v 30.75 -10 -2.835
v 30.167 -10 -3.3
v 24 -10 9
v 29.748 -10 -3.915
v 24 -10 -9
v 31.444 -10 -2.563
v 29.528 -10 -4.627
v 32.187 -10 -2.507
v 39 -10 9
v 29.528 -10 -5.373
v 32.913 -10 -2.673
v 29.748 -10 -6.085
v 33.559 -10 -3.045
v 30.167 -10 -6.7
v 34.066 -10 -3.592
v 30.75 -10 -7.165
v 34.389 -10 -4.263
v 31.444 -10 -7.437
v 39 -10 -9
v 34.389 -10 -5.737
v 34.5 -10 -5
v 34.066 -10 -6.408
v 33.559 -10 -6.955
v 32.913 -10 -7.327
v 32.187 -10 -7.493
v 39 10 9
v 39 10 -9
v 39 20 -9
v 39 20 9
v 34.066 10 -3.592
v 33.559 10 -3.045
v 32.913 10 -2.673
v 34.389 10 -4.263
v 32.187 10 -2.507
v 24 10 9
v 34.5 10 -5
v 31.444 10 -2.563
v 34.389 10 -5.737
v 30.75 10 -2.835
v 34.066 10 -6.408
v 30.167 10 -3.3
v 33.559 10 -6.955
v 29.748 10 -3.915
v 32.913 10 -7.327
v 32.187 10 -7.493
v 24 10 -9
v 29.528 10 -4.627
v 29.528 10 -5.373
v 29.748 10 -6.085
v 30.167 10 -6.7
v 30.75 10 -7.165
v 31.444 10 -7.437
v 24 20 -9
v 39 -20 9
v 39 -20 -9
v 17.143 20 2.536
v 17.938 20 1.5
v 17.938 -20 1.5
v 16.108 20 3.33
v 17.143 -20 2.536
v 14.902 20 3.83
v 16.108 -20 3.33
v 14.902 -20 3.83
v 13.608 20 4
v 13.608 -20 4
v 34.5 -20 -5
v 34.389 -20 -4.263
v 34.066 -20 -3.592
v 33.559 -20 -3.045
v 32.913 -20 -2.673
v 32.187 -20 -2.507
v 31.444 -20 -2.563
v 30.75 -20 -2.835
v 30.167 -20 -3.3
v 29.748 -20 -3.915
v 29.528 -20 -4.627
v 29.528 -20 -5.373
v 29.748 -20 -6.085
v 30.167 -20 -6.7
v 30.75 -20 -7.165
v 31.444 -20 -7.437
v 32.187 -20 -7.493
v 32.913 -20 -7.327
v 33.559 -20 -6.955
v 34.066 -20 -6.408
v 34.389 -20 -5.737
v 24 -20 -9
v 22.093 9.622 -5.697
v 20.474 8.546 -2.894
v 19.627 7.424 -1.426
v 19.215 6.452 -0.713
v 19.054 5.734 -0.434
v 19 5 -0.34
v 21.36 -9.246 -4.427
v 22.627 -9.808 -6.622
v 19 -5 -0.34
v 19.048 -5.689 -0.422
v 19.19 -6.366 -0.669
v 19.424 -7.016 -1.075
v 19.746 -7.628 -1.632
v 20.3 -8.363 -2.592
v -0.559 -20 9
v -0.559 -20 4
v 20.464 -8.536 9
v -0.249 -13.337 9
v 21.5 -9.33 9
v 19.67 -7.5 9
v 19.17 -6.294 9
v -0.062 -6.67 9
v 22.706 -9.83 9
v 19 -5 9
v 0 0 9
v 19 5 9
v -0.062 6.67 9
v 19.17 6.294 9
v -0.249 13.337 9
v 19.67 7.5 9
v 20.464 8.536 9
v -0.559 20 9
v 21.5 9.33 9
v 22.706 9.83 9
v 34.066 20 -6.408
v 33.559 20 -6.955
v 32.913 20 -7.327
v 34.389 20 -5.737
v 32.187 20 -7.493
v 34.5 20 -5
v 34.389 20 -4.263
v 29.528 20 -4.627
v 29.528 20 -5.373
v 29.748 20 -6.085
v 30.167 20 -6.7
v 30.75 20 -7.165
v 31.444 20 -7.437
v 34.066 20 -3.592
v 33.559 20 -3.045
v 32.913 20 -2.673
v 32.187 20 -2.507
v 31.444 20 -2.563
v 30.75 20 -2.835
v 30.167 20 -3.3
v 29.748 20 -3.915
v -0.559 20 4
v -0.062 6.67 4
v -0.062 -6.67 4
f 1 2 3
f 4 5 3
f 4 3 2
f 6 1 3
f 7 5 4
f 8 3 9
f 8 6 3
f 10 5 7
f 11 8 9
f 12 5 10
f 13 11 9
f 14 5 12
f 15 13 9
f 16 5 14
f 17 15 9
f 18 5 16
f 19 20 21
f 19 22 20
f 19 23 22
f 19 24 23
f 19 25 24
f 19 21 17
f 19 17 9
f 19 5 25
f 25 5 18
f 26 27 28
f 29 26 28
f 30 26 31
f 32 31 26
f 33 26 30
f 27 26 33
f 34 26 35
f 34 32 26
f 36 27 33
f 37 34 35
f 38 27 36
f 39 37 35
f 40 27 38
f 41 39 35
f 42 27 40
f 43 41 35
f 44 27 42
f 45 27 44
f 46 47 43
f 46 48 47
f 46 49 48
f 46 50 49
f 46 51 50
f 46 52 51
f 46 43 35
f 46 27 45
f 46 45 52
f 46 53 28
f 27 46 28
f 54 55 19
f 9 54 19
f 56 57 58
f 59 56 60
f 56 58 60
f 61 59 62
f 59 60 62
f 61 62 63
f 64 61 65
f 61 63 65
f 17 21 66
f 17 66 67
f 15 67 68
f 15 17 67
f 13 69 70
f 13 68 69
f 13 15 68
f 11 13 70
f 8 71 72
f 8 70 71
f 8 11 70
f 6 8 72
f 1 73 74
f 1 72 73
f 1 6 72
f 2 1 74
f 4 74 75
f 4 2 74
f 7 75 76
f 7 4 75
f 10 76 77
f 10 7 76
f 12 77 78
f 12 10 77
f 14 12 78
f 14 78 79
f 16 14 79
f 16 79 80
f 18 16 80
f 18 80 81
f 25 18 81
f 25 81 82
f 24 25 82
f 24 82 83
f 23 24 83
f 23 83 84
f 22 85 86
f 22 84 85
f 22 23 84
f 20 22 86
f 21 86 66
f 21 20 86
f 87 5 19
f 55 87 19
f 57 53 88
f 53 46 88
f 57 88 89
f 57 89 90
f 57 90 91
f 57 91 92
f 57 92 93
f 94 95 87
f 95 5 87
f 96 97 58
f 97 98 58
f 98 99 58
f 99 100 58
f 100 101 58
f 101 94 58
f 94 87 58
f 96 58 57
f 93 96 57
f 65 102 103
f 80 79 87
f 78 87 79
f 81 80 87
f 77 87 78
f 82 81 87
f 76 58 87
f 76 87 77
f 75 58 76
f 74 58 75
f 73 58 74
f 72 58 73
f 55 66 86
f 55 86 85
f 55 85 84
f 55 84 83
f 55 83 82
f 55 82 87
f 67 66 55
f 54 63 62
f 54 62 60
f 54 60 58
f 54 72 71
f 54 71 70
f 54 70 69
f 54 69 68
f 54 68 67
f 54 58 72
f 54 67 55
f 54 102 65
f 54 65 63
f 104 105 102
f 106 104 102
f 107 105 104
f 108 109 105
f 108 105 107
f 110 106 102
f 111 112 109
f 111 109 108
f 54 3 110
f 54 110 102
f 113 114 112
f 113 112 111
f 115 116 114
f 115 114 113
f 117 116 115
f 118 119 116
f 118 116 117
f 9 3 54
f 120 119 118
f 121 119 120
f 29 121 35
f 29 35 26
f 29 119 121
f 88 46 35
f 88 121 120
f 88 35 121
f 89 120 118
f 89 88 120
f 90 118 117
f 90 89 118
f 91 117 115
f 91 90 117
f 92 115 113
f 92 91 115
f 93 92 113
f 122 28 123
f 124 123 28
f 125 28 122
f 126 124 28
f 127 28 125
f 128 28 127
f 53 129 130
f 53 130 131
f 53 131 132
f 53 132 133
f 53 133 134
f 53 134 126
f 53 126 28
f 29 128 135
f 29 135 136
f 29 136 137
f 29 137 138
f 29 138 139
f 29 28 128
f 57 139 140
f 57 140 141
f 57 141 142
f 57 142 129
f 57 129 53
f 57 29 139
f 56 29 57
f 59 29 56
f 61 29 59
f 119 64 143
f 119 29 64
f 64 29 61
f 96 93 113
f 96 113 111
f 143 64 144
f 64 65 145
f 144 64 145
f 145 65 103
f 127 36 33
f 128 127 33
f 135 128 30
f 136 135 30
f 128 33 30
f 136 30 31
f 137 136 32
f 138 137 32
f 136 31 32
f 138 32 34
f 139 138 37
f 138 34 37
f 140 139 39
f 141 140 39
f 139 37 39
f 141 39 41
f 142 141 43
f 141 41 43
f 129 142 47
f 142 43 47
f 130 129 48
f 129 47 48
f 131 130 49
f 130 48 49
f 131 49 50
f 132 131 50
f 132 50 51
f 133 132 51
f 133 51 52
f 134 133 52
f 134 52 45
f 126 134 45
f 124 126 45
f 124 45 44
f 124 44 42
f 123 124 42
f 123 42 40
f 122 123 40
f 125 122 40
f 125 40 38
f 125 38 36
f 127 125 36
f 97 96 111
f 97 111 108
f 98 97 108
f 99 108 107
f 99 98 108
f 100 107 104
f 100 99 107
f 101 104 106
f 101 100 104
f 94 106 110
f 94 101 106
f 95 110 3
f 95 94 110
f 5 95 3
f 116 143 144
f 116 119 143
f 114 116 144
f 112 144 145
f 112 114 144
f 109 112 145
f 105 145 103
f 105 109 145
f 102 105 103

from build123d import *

# Parameters (mm, degrees)
F1_DEPTH      = 9
F1_DEPTH_BACK = 9
F3_DEPTH      = 25
F3_DEPTH_BACK = 25
F5_DEPTH      = 25
F5_DEPTH_BACK = 25
F6_R          = 2.5
F7_DEPTH      = 25
F7_DEPTH_BACK = 25


with BuildPart() as f1:
    # F0 (on Top) → F1 (new body, two sides)
    with BuildSketch(Plane.XY) as f1_sk:
        with BuildLine():
            ThreePointArc((-0.5590957934, 20), (-0.139801245, 10.0039065883), (0, 0))
            ThreePointArc((0, 0), (-0.139801245, -10.0039065883), (-0.5590957934, -20))
            Line((-0.5590957934, -20), (39, -20))
            Line((39, -20), (39, 20))
            Line((39, 20), (-0.5590957934, 20))
        make_face()
    extrude(amount=F1_DEPTH)
    extrude(f1_sk.sketch, amount=-F1_DEPTH_BACK)

    # F2 (on Front) → F3 (cut, two sides)
    with BuildSketch(Plane.XZ) as f3_sk:
        with BuildLine():
            Line((-2.6374068111, -9), (24, -9))
            Line((24, -9), (17.9378221735, 1.5))
            ThreePointArc((17.9378221735, 1.5), (16.1076951546, 3.3301270189), (13.6076951546, 4))
            Line((13.6076951546, 4), (-2.6374068111, 4))
            Line((-2.6374068111, 4), (-2.6374068111, -9))
        make_face()
    extrude(amount=-F3_DEPTH, mode=Mode.SUBTRACT)
    extrude(f3_sk.sketch, amount=F3_DEPTH_BACK, mode=Mode.SUBTRACT)

    # F4 (on Top) → F5 (cut, two sides)
    with BuildSketch(Plane.XY) as f5_sk:
        with BuildLine():
            ThreePointArc((19, -5), (20.4644660941, -8.5355339059), (24, -10))
            Line((24, -10), (41.5962561965, -10))
            Line((41.5962561965, -10), (41.5962561965, 10))
            Line((41.5962561965, 10), (24, 10))
            ThreePointArc((24, 10), (20.4644660941, 8.5355339059), (19, 5))
            Line((19, 5), (19, 0))
            Line((19, 0), (19, -5))
        make_face()
    extrude(amount=-F5_DEPTH, mode=Mode.SUBTRACT)
    extrude(f5_sk.sketch, amount=F5_DEPTH_BACK, mode=Mode.SUBTRACT)

    # F6 (on Front) → F7 (cut, two sides)
    with BuildSketch(Plane.XZ) as f7_sk:
        with Locations((32, -5)):
            Circle(F6_R)
    extrude(amount=-F7_DEPTH, mode=Mode.SUBTRACT)
    extrude(f7_sk.sketch, amount=F7_DEPTH_BACK, mode=Mode.SUBTRACT)


solid = f1.part
